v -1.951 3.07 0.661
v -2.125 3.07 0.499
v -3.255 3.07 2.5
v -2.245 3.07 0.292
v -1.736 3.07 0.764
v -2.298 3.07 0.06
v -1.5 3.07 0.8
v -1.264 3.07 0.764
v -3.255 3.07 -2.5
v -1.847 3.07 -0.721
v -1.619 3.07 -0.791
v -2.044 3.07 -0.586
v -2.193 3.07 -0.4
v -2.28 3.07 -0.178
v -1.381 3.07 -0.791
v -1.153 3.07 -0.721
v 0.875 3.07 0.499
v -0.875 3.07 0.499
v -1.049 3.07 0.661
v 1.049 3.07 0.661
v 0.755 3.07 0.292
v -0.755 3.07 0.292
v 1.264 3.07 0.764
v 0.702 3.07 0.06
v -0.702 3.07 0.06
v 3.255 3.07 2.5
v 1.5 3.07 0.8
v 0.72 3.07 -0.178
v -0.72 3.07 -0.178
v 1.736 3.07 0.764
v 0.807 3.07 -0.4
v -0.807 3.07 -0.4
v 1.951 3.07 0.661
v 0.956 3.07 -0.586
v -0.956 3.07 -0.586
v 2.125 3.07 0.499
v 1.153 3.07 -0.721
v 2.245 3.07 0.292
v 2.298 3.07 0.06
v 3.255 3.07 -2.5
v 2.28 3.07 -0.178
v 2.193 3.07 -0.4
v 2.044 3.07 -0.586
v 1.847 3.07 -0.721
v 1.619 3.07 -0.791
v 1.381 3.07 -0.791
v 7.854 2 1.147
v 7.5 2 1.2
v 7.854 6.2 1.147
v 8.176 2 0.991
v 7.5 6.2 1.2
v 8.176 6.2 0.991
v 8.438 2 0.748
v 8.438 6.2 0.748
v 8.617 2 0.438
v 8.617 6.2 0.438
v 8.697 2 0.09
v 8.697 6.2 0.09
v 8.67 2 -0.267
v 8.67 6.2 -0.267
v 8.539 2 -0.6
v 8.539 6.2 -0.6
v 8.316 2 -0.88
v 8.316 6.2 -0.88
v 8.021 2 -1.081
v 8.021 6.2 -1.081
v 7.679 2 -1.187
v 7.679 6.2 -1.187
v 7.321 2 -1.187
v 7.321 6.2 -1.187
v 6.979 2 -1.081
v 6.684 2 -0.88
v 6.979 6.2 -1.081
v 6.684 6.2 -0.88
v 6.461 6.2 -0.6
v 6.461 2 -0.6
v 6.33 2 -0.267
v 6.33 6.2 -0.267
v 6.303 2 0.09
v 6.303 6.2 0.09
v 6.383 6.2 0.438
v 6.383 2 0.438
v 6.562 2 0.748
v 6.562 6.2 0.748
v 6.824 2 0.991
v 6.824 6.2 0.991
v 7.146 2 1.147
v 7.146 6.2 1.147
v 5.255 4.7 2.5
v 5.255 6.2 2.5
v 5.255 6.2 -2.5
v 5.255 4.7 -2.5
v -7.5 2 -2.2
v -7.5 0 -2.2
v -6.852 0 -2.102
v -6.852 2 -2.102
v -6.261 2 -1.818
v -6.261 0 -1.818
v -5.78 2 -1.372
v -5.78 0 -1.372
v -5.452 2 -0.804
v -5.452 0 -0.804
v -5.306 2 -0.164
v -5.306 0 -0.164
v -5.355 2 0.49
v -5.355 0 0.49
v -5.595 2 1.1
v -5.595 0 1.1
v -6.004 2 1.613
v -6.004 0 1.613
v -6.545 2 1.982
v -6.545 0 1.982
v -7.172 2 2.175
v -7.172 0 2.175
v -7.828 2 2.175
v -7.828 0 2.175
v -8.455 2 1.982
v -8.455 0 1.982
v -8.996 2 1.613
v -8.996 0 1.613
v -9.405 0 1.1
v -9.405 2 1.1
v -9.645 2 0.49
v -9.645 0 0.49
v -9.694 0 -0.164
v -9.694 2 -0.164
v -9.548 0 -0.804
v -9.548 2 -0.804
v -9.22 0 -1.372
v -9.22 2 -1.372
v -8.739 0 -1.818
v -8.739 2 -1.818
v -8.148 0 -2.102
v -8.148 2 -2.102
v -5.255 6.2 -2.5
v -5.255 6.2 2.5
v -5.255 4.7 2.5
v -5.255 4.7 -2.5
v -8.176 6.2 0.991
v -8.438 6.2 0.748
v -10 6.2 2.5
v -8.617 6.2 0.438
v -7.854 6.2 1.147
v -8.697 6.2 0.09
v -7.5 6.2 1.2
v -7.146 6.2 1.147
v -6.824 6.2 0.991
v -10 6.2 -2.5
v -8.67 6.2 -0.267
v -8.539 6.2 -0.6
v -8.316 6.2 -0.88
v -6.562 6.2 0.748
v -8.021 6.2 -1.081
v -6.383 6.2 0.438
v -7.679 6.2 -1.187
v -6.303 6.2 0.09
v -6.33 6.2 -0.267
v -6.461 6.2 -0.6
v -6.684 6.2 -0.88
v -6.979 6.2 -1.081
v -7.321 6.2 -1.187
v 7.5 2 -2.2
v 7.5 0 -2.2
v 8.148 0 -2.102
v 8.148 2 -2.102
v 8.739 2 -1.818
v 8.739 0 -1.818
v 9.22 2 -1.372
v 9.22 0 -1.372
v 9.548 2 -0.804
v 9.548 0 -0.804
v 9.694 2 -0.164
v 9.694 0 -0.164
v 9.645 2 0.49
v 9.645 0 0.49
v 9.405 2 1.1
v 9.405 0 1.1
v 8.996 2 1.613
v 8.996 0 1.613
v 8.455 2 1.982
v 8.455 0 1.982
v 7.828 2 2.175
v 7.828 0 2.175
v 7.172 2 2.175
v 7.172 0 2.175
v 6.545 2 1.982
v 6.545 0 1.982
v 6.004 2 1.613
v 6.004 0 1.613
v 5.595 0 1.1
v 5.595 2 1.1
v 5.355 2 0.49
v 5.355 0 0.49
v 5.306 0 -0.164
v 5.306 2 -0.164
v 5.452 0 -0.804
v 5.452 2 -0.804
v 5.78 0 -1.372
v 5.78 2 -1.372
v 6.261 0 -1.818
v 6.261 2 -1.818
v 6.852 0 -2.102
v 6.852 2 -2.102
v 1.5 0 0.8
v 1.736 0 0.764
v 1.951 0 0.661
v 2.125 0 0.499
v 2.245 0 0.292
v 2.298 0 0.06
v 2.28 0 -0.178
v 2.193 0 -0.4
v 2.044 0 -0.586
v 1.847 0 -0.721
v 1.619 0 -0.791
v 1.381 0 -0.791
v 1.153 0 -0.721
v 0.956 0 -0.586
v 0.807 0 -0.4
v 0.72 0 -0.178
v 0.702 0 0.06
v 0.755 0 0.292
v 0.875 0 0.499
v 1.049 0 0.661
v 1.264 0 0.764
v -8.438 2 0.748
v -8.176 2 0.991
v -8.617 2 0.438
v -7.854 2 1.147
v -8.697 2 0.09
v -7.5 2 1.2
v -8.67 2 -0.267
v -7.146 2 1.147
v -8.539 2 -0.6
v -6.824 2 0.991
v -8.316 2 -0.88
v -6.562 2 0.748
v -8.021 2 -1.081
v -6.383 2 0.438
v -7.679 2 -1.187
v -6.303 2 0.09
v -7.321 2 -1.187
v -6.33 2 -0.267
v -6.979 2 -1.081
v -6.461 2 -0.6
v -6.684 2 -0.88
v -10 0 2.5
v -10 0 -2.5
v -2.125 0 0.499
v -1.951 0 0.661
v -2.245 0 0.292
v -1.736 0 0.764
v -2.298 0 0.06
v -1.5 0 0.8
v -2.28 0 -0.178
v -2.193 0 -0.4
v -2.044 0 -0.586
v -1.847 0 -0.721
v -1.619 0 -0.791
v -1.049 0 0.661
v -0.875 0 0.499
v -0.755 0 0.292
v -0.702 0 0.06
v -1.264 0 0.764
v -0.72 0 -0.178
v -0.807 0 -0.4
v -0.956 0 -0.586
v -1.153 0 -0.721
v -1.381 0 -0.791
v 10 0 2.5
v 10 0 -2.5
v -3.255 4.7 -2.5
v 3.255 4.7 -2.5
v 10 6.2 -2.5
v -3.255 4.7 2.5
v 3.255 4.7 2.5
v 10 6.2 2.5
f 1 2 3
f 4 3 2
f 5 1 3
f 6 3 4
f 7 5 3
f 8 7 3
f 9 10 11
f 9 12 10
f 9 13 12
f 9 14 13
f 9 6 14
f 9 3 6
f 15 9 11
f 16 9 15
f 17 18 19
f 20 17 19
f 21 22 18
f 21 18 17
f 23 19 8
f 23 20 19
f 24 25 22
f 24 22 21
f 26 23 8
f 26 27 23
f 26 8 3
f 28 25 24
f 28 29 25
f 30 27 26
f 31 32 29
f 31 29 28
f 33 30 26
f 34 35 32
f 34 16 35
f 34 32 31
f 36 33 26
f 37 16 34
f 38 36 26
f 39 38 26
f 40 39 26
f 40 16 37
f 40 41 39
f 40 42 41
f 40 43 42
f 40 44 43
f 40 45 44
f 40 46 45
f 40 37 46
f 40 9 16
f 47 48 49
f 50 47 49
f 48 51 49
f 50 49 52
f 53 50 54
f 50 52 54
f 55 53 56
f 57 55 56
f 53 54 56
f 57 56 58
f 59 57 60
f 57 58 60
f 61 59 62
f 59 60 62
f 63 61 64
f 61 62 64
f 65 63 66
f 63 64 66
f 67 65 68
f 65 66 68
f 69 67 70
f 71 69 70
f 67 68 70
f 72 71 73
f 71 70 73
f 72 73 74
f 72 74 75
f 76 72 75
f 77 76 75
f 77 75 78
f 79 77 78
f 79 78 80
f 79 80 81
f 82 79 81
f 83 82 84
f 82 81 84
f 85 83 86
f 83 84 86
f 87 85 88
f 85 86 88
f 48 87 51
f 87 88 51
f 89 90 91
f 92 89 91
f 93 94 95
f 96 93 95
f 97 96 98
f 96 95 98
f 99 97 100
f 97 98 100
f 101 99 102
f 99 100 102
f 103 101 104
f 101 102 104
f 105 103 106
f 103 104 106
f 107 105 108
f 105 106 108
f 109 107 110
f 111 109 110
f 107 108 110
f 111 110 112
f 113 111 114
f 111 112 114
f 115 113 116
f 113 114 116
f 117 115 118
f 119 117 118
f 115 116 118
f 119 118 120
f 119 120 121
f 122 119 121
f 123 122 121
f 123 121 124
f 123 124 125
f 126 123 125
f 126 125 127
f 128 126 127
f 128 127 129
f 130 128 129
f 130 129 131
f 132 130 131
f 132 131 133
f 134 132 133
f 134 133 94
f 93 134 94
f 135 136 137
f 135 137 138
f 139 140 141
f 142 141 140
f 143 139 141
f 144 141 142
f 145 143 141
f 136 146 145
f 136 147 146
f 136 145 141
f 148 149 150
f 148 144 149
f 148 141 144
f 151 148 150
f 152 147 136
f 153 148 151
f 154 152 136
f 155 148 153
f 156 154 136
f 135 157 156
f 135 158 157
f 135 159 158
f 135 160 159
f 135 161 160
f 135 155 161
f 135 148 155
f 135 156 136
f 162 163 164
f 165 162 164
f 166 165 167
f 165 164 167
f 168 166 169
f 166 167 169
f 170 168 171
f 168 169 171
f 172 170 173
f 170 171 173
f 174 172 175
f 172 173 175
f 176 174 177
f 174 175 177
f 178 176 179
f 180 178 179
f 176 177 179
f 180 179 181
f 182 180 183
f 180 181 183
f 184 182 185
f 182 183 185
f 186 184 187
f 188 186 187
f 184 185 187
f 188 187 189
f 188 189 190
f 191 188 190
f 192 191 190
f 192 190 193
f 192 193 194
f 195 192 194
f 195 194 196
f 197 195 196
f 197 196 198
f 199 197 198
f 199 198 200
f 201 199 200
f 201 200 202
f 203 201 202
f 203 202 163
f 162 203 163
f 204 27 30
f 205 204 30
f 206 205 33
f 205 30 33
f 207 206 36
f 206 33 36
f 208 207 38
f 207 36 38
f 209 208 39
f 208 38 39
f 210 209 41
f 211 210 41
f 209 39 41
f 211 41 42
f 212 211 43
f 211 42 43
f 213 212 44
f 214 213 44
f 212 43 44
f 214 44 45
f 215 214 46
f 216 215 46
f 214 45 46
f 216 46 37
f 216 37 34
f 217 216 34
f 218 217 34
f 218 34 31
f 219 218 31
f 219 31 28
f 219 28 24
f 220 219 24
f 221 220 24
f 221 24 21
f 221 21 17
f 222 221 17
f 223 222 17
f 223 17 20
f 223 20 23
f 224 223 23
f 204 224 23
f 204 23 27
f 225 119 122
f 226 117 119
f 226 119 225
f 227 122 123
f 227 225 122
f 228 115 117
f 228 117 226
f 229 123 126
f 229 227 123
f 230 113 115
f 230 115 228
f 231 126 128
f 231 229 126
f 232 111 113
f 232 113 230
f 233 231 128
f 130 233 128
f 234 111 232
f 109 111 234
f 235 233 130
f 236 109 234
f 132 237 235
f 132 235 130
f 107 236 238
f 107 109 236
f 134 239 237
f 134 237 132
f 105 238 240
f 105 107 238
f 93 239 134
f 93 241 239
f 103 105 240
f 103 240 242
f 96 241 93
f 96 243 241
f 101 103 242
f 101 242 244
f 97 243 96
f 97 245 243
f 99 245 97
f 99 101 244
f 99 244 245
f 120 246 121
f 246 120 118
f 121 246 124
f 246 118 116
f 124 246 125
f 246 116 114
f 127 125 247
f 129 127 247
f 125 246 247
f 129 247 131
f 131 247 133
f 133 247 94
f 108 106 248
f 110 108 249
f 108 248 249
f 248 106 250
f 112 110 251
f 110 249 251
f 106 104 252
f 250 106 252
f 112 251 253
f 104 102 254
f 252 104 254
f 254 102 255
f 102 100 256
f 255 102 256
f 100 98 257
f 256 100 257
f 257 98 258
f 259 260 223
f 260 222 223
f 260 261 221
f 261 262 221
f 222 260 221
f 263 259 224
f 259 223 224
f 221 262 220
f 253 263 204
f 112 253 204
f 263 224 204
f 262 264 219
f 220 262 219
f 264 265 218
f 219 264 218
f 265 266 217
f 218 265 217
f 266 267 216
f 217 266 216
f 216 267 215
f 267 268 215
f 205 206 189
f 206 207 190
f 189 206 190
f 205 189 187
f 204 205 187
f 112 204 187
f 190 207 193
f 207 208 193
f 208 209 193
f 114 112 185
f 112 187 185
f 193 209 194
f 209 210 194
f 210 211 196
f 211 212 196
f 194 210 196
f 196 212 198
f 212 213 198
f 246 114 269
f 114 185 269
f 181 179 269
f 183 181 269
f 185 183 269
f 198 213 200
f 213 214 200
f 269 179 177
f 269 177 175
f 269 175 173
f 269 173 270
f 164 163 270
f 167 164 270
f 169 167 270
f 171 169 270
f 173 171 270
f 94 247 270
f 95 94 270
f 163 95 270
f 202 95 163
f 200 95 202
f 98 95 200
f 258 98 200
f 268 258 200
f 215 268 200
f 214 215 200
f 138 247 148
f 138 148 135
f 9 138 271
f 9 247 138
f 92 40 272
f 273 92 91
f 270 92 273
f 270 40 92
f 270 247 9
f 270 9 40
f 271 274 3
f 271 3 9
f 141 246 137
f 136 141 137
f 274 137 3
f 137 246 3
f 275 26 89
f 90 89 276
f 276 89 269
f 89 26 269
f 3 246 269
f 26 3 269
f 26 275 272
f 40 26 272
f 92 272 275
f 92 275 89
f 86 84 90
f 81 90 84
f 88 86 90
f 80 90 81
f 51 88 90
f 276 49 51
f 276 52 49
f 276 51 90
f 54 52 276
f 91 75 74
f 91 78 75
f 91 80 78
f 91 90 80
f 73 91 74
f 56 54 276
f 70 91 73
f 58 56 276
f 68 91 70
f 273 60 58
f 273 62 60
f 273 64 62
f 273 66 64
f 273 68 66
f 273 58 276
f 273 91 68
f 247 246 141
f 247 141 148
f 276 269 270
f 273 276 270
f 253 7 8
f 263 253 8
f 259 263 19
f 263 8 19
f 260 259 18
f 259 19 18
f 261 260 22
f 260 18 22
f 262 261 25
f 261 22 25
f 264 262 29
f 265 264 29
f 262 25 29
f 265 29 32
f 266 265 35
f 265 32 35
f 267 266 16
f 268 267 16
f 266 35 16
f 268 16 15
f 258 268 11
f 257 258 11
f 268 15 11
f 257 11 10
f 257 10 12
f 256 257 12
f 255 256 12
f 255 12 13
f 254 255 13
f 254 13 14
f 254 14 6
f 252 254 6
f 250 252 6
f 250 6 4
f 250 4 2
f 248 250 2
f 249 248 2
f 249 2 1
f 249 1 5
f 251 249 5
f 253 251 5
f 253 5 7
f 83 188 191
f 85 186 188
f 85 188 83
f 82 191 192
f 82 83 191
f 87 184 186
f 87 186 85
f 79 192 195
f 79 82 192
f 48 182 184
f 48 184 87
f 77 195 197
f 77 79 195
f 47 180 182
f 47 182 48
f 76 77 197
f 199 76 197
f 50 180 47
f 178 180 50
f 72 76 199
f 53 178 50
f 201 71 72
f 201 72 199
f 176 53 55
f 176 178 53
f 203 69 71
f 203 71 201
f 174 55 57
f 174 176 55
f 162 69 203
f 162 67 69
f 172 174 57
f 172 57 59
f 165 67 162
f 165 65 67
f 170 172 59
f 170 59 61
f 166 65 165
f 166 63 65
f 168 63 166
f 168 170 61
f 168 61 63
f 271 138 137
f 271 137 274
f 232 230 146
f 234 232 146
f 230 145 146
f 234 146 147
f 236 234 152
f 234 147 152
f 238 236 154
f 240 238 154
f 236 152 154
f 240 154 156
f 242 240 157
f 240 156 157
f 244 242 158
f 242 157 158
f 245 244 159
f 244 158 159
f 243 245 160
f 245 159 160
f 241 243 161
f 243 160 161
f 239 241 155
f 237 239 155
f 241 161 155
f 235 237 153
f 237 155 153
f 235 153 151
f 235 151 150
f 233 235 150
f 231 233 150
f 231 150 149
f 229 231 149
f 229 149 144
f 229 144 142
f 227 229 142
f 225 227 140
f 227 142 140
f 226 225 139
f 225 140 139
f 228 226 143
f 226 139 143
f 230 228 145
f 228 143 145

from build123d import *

# Parameters (mm, degrees)
SKETCH1_W                      = 20
SKETCH1_H                      = 5
EXTRUDE1_DEPTH                 = 6.2
SKETCH2_W                      = 10.51
SKETCH2_H                      = 5
EXTRUDE3_DEPTH                 = 1.5
SKETCH3_W                      = 6.51
SKETCH3_H                      = 5
EXTRUDE4_DEPTH                 = 1.63
CBORE_FOR_M2_SHCS1_D           = 2.4
CBORE_FOR_M2_SHCS1_CBORE_D     = 4.4
CBORE_FOR_M2_SHCS1_CBORE_DEPTH = 2
LPATTERN1_COUNT                = 2
LPATTERN1_PITCH                = 15
M2X0_4_TAPPED_HOLE1_D          = 1.6
LPATTERN3_COUNT                = 2
LPATTERN3_PITCH                = 3


with BuildPart() as part:
    # Sketch1 → Extrude1 (new body)
    with BuildSketch(Plane(origin=(0, 0, 0), x_dir=(1, 0, 0), z_dir=(0, 1, 0))):
        Rectangle(SKETCH1_W, SKETCH1_H)
    extrude(amount=EXTRUDE1_DEPTH)

    # Sketch2 → Extrude3 (cut)
    with BuildSketch(Plane(origin=(0, 6.2, 0), x_dir=(1, 0, 0), z_dir=(0, 1, 0))):
        Rectangle(SKETCH2_W, SKETCH2_H)
    extrude(amount=-EXTRUDE3_DEPTH, mode=Mode.SUBTRACT)

    # Sketch3 → Extrude4 (cut)
    with BuildSketch(Plane(origin=(0, 4.7, 0), x_dir=(1, 0, 0), z_dir=(0, 1, 0))):
        Rectangle(SKETCH3_W, SKETCH3_H)
    extrude(amount=-EXTRUDE4_DEPTH, mode=Mode.SUBTRACT)

    # CBORE for M2 SHCS1 (through all)
    with Locations(Plane(origin=(-7.5, 0, 0), x_dir=(0, 0, -1), z_dir=(0, -1, 0))):
        with Locations((0, 0)):
            cbore_for_m2_shcs1 = CounterBoreHole(CBORE_FOR_M2_SHCS1_D / 2, CBORE_FOR_M2_SHCS1_CBORE_D / 2, CBORE_FOR_M2_SHCS1_CBORE_DEPTH)

    # LPattern1: CBORE for M2 SHCS1 ×2
    with Locations(*[(i * LPATTERN1_PITCH, 0, 0) for i in range(1, LPATTERN1_COUNT)]):
        add(cbore_for_m2_shcs1, mode=Mode.SUBTRACT)

    # M2x0.4 Tapped Hole1 (through all)
    with Locations(Plane(origin=(-1.5, 0, 0), x_dir=(0, 0, -1), z_dir=(0, -1, 0))):
        with Locations((0, 0)):
            m2x0_4_tapped_hole1 = Hole(M2X0_4_TAPPED_HOLE1_D / 2)

    # LPattern3: M2x0.4 Tapped Hole1 ×2
    with Locations(*[(i * LPATTERN3_PITCH, 0, 0) for i in range(1, LPATTERN3_COUNT)]):
        add(m2x0_4_tapped_hole1, mode=Mode.SUBTRACT)


solid = part.part
